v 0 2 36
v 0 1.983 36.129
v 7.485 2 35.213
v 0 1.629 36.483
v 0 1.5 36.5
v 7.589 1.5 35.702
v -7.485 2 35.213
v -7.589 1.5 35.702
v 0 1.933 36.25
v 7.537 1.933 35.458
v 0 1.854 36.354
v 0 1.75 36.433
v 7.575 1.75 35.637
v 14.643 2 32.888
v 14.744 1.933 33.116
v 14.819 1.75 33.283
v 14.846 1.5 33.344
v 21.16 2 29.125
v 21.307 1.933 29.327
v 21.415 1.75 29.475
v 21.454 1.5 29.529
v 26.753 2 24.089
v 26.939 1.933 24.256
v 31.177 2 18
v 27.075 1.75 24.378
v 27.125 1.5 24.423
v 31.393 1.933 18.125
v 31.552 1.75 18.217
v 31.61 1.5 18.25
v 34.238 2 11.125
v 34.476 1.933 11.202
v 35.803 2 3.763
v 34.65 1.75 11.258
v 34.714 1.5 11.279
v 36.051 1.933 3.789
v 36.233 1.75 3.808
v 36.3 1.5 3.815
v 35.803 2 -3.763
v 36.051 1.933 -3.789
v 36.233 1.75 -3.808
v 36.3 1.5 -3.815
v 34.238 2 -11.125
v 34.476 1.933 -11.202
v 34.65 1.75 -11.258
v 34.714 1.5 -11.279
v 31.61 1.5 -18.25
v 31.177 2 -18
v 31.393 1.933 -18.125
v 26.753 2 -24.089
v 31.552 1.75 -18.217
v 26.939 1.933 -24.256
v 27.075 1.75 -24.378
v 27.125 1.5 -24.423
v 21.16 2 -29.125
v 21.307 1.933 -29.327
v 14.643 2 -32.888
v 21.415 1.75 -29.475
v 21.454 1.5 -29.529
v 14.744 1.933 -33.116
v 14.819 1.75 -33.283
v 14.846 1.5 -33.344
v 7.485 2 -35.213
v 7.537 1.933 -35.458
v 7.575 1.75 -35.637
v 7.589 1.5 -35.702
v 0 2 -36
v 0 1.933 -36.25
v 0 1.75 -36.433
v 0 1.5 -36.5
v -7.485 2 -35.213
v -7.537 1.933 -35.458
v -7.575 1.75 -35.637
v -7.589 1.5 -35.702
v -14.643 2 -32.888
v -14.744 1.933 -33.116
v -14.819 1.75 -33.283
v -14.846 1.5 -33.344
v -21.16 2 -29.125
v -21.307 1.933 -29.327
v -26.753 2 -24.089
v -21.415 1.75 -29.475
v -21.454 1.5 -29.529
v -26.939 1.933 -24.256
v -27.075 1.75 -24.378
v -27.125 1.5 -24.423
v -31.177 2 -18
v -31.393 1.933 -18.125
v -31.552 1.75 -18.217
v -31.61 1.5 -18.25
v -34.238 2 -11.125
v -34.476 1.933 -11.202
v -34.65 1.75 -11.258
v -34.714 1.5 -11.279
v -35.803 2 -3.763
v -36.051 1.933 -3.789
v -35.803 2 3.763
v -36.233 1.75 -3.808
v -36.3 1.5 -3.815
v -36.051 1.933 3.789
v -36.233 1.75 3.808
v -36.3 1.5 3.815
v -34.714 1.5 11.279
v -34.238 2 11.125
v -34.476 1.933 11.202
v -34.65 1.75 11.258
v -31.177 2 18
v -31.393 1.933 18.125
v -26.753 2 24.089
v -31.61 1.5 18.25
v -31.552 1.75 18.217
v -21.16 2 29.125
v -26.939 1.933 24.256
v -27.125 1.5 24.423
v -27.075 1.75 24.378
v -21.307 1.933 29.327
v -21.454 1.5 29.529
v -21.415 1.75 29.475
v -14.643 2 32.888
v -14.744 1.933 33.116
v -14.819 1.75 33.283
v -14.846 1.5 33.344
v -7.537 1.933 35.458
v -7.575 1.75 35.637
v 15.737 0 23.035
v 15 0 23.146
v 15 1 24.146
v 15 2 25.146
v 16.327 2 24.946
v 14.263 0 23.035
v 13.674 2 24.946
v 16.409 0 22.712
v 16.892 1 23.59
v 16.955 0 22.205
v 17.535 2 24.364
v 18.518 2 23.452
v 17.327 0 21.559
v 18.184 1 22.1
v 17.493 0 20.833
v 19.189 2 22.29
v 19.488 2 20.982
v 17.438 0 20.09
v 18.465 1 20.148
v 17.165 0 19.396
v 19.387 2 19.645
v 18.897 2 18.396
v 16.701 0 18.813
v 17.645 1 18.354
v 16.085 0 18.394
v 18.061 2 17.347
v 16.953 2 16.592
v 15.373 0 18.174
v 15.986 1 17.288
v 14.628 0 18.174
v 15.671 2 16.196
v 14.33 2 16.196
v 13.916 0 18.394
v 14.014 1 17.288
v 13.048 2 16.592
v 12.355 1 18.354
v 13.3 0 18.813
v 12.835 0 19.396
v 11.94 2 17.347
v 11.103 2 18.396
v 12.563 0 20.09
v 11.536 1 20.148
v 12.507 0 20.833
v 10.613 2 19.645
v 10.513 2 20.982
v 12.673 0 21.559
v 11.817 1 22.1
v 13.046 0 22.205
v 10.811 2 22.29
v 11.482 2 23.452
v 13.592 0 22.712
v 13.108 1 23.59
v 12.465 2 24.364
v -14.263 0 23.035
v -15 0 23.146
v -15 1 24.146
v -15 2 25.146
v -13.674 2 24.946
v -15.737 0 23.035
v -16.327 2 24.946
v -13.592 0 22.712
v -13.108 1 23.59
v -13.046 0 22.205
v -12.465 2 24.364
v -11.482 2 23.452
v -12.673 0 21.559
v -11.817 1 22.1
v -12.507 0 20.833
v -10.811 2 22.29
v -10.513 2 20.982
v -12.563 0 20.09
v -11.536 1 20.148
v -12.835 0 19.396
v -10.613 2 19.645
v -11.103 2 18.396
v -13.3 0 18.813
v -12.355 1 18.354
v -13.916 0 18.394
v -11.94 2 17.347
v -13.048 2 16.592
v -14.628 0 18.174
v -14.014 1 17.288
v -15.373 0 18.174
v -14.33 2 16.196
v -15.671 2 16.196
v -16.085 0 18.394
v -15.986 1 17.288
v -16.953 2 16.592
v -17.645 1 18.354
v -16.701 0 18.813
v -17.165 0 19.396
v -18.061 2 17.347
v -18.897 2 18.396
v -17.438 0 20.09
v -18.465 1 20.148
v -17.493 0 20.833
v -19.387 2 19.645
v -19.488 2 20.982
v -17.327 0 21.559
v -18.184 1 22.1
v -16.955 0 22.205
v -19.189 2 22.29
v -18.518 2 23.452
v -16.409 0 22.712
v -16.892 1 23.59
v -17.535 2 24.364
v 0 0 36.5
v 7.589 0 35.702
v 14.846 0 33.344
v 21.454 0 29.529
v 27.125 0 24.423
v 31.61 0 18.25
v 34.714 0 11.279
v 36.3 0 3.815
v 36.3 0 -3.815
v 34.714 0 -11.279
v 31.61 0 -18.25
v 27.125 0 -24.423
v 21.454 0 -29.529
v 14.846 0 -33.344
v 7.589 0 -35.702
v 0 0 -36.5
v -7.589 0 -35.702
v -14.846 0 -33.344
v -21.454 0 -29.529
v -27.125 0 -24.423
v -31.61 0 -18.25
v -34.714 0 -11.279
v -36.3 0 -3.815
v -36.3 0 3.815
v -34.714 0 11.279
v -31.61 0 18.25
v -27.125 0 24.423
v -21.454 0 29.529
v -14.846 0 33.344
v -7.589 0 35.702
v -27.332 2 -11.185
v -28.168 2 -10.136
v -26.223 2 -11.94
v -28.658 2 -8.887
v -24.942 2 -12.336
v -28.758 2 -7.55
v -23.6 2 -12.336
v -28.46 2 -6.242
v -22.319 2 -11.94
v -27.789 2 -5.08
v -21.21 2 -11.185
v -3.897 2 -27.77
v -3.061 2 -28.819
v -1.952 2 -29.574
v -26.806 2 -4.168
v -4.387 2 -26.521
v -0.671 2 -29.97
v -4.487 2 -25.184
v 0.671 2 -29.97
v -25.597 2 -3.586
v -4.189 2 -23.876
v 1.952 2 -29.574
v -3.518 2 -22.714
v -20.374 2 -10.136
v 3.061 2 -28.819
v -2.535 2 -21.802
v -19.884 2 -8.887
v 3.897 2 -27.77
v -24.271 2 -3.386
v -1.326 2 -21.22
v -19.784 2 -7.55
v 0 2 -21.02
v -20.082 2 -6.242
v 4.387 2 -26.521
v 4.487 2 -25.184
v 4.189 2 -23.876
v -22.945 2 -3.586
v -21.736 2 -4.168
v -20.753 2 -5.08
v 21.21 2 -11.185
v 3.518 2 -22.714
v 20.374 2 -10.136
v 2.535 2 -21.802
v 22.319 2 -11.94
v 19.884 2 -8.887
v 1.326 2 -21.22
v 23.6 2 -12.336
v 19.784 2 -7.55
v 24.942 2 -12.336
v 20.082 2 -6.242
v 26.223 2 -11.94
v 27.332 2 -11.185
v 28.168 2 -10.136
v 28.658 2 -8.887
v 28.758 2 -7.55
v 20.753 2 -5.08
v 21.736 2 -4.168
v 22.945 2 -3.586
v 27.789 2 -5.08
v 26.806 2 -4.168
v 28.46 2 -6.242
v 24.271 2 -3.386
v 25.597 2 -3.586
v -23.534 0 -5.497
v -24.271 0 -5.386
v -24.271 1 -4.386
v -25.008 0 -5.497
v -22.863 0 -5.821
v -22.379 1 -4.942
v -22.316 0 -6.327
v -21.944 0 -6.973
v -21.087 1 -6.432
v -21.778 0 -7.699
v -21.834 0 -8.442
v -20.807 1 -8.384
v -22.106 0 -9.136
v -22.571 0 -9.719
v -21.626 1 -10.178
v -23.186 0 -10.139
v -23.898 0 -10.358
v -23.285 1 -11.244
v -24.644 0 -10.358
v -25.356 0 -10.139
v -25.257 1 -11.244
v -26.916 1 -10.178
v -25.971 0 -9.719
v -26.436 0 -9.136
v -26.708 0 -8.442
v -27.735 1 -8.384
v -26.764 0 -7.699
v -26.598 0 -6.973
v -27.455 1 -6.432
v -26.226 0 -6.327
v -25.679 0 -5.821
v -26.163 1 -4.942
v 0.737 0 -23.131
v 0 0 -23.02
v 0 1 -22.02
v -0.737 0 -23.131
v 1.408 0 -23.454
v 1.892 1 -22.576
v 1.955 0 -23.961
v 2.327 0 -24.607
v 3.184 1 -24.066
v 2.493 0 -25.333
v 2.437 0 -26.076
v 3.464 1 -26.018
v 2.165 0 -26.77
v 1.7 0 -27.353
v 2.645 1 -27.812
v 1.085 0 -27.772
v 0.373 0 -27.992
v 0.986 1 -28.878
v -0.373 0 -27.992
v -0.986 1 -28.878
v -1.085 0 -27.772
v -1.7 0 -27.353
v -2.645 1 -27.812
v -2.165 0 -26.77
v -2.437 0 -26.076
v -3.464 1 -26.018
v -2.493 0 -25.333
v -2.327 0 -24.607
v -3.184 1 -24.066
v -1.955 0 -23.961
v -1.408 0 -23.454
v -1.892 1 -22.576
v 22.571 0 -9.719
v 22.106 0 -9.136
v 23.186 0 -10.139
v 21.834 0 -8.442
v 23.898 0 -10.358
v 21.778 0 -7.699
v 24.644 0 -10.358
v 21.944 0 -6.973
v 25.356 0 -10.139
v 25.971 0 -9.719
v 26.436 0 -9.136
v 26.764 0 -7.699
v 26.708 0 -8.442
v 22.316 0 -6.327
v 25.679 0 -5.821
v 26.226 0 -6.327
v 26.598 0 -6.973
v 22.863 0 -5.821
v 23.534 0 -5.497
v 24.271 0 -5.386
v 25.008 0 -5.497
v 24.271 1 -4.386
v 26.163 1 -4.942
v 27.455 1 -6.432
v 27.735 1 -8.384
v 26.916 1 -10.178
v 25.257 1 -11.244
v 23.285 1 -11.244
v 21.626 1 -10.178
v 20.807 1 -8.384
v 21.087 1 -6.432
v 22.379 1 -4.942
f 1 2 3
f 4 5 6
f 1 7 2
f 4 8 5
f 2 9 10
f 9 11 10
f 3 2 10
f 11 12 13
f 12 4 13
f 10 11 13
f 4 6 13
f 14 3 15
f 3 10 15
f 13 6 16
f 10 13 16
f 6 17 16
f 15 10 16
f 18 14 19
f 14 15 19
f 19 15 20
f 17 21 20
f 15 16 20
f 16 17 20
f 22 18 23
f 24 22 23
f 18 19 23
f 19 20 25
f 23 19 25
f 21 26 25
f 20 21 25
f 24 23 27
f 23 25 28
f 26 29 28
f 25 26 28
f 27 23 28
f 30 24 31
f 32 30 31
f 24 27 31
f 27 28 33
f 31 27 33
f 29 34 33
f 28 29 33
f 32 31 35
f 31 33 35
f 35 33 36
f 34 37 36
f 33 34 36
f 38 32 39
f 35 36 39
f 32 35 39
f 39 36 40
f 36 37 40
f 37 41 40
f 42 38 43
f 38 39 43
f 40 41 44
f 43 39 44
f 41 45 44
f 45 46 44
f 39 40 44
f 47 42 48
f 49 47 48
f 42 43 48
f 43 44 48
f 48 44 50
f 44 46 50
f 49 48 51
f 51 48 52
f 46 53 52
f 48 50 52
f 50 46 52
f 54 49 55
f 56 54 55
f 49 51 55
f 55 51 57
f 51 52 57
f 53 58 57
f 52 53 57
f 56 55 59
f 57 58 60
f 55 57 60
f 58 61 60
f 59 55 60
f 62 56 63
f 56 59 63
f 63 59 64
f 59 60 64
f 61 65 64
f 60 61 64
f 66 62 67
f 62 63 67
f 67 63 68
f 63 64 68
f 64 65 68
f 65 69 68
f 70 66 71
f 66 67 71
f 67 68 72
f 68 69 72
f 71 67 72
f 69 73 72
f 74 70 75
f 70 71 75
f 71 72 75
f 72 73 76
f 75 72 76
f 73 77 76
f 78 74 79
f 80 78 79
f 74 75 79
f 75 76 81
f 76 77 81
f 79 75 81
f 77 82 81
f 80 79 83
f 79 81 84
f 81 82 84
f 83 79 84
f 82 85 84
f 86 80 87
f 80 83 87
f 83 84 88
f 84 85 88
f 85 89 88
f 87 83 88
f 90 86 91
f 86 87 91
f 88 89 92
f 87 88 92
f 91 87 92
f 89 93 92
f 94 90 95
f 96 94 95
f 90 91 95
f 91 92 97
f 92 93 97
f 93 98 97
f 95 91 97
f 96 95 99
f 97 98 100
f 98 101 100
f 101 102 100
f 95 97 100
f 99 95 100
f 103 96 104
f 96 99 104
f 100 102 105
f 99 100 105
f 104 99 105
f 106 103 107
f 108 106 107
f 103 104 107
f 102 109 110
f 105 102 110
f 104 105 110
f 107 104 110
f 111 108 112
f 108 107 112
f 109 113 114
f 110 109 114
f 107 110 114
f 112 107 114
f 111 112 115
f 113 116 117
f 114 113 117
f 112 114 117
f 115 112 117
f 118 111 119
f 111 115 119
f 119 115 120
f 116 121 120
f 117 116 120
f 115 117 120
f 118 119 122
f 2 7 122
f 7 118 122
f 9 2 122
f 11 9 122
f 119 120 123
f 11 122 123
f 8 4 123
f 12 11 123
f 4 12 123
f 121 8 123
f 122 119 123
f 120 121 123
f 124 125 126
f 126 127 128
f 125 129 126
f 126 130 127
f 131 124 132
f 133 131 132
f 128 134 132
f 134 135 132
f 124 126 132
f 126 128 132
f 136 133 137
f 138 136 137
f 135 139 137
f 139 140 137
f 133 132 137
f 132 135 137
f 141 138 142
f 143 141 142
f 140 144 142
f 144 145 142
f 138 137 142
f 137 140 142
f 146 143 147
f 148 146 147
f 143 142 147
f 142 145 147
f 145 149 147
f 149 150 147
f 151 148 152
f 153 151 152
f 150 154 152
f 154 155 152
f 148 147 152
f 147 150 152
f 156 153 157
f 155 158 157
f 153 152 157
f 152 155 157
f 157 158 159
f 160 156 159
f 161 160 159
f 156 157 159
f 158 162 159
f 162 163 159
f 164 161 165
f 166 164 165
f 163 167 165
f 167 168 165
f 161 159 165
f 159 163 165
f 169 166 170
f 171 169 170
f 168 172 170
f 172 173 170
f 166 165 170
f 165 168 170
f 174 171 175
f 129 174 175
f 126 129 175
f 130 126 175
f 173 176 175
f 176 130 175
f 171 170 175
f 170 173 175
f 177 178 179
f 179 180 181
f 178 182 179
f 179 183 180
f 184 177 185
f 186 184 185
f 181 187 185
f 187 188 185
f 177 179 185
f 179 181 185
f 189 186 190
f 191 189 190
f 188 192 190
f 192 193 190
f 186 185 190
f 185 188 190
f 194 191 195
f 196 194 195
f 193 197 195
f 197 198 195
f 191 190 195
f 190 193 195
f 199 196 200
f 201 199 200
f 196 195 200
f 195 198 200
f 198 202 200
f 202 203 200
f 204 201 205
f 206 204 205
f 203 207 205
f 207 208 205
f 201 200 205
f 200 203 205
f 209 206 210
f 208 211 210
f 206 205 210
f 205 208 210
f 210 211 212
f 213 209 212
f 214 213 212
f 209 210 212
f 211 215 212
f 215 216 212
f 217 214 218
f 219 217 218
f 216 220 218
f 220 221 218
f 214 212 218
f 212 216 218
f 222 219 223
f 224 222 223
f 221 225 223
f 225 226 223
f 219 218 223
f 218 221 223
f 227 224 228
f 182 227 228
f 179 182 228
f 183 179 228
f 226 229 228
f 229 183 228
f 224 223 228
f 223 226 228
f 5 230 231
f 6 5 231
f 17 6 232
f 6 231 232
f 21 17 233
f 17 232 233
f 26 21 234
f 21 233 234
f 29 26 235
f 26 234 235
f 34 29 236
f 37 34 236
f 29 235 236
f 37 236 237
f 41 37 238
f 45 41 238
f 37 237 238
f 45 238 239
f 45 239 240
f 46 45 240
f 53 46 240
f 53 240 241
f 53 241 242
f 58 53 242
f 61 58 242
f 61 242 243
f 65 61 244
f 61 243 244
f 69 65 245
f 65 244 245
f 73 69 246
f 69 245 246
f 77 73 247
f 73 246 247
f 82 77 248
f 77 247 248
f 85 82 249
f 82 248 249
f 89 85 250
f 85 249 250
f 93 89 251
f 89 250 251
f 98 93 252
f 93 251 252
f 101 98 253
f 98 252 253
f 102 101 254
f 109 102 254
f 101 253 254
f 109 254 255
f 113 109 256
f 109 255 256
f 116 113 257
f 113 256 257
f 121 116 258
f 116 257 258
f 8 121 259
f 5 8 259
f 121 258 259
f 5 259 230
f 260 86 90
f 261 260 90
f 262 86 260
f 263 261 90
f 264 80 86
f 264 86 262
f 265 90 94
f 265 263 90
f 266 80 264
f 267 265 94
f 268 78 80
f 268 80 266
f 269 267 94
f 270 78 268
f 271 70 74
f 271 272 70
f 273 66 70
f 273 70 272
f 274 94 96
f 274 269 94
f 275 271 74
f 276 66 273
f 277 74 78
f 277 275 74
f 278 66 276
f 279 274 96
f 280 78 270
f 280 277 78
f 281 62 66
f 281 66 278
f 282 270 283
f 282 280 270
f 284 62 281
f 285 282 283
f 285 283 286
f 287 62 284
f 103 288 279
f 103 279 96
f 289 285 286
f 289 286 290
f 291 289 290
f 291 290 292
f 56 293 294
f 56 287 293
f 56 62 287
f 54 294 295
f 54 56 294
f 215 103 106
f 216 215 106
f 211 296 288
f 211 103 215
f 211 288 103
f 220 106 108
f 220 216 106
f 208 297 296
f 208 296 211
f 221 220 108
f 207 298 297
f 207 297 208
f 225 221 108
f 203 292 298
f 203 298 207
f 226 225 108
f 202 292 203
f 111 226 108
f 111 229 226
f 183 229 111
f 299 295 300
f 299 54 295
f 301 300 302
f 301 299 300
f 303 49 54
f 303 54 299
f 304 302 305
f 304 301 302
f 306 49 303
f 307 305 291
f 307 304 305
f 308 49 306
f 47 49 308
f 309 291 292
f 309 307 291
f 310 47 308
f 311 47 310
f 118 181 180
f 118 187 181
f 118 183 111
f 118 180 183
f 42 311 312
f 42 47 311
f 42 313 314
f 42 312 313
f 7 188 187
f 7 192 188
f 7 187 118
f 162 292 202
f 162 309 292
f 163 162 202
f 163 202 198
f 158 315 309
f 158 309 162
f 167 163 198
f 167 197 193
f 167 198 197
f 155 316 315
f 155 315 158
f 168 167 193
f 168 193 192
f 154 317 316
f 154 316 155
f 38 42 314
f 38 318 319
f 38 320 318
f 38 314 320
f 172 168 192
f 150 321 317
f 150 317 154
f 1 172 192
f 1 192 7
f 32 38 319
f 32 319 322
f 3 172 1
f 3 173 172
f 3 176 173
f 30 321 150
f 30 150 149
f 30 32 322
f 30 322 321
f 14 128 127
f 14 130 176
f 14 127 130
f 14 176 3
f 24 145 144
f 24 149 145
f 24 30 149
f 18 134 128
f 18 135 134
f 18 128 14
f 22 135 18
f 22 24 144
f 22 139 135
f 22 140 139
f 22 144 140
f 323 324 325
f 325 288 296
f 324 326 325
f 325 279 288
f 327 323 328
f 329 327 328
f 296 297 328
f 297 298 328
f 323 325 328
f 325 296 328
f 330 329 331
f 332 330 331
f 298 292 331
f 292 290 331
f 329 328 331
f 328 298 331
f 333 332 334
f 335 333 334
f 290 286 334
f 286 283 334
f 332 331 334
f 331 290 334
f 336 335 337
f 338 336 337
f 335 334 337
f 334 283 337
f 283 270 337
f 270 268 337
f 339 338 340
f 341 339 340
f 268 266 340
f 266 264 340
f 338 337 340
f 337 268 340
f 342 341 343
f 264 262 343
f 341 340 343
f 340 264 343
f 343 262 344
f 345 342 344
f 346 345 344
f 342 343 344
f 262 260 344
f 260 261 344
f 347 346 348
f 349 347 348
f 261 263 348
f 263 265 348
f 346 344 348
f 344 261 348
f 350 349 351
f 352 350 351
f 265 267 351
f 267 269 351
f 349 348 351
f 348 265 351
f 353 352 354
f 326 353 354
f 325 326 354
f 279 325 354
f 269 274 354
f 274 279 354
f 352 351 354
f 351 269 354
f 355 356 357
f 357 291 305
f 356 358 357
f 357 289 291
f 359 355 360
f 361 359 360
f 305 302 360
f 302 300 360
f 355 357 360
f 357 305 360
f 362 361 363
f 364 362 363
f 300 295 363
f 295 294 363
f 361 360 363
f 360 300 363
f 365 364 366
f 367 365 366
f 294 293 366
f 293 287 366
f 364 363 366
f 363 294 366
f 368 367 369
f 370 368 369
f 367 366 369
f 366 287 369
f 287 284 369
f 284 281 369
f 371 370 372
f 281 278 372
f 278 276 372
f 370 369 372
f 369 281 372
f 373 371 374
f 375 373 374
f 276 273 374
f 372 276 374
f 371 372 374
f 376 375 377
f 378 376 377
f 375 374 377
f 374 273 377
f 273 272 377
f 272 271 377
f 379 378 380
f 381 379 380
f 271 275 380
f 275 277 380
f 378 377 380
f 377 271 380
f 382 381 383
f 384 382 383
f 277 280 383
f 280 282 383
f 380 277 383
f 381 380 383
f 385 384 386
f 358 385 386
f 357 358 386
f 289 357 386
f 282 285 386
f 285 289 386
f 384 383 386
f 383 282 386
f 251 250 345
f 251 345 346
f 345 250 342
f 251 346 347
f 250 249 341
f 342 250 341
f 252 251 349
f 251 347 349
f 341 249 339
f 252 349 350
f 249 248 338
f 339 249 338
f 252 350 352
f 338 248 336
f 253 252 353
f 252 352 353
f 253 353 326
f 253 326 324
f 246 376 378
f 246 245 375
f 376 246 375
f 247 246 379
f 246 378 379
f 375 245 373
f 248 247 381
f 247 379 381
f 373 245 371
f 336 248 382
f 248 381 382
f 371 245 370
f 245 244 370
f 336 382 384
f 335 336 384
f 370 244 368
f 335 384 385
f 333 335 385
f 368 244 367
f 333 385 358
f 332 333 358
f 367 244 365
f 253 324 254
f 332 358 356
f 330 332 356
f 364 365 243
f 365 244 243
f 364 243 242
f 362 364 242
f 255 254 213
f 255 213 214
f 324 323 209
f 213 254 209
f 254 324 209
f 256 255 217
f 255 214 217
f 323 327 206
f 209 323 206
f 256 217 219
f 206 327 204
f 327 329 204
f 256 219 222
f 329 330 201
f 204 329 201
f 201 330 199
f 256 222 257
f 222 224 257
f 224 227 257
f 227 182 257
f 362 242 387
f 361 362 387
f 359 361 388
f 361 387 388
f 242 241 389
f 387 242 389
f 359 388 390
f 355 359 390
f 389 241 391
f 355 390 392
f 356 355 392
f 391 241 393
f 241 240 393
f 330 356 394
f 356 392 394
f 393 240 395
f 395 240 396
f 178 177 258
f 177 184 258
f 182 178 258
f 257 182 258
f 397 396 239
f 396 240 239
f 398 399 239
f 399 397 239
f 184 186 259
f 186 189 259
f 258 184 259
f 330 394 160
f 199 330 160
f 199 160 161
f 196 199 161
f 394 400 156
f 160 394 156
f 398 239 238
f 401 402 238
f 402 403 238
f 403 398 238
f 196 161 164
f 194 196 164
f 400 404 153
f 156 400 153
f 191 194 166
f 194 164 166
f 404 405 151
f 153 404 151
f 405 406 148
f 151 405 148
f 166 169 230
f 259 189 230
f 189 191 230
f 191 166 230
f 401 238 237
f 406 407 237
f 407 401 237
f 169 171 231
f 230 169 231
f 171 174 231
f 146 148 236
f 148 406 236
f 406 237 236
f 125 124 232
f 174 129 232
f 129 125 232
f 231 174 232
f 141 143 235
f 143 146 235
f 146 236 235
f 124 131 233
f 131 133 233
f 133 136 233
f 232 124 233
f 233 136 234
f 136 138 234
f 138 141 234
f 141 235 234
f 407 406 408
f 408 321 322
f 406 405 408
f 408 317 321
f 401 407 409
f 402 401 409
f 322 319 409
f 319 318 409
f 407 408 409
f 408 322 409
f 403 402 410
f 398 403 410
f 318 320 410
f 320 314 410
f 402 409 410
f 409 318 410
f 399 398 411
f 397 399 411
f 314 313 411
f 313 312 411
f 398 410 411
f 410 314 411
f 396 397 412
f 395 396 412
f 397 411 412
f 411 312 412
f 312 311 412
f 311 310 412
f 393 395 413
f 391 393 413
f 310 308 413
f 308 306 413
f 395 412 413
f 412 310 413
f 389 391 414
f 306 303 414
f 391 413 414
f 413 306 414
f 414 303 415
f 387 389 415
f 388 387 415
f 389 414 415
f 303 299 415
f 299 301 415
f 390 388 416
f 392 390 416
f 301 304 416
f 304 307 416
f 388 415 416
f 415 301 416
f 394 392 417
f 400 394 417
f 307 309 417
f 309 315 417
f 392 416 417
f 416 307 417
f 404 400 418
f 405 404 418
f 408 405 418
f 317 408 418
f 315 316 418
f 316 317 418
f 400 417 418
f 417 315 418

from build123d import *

# Parameters (mm, degrees)
SKETCH2_R           = 36.5
SKETCH2_R_2         = 2.5
BOSS_EXTRUDE1_DEPTH = 2
CHAMFER1_SIZE       = 2
FILLET1_R           = 0.5


with BuildPart() as part:
    # Sketch2 → Boss-Extrude1 (new body)
    with BuildSketch(Plane(origin=(0, 0, 0), x_dir=(1, 0, 0), z_dir=(0, 1, 0))):
        with Locations(Location((0, 0, 0), (0, 0, 270))):
            Circle(SKETCH2_R)
        with Locations(Location((0, 25.52, 0), (0, 0, 270))):
            Circle(SKETCH2_R_2, mode=Mode.SUBTRACT)
        with Locations(Location((24.270962296, 7.886113696, 0), (0, 0, 270))):
            Circle(SKETCH2_R_2, mode=Mode.SUBTRACT)
        with Locations(Location((15.000279639, -20.646113696, 0), (0, 0, 270))):
            Circle(SKETCH2_R_2, mode=Mode.SUBTRACT)
        with Locations(Location((-15.000279639, -20.646113696, 0), (0, 0, 270))):
            Circle(SKETCH2_R_2, mode=Mode.SUBTRACT)
        with Locations(Location((-24.270962296, 7.886113696, 0), (0, 0, 270))):
            Circle(SKETCH2_R_2, mode=Mode.SUBTRACT)
    extrude(amount=BOSS_EXTRUDE1_DEPTH)

    # Chamfer1
    chamfer1_edges = [part.edges().sort_by_distance(p)[0] for p in [
        (-24.270962296, 2, -10.386113696),
        (-15.000279639, 2, 18.146113696),
        (15.000279639, 2, 18.146113696),
        (24.270962296, 2, -10.386113696),
        (0, 2, -28.02),
    ]]
    chamfer(chamfer1_edges, length=CHAMFER1_SIZE - 0.0001)  # a hair under: the kernel refuses the full size

    # Fillet1
    fillet1_edges = [part.edges().sort_by_distance(p)[0] for p in [
        (0, 2, -36.5),
    ]]
    fillet(fillet1_edges, radius=FILLET1_R)


solid = part.part
